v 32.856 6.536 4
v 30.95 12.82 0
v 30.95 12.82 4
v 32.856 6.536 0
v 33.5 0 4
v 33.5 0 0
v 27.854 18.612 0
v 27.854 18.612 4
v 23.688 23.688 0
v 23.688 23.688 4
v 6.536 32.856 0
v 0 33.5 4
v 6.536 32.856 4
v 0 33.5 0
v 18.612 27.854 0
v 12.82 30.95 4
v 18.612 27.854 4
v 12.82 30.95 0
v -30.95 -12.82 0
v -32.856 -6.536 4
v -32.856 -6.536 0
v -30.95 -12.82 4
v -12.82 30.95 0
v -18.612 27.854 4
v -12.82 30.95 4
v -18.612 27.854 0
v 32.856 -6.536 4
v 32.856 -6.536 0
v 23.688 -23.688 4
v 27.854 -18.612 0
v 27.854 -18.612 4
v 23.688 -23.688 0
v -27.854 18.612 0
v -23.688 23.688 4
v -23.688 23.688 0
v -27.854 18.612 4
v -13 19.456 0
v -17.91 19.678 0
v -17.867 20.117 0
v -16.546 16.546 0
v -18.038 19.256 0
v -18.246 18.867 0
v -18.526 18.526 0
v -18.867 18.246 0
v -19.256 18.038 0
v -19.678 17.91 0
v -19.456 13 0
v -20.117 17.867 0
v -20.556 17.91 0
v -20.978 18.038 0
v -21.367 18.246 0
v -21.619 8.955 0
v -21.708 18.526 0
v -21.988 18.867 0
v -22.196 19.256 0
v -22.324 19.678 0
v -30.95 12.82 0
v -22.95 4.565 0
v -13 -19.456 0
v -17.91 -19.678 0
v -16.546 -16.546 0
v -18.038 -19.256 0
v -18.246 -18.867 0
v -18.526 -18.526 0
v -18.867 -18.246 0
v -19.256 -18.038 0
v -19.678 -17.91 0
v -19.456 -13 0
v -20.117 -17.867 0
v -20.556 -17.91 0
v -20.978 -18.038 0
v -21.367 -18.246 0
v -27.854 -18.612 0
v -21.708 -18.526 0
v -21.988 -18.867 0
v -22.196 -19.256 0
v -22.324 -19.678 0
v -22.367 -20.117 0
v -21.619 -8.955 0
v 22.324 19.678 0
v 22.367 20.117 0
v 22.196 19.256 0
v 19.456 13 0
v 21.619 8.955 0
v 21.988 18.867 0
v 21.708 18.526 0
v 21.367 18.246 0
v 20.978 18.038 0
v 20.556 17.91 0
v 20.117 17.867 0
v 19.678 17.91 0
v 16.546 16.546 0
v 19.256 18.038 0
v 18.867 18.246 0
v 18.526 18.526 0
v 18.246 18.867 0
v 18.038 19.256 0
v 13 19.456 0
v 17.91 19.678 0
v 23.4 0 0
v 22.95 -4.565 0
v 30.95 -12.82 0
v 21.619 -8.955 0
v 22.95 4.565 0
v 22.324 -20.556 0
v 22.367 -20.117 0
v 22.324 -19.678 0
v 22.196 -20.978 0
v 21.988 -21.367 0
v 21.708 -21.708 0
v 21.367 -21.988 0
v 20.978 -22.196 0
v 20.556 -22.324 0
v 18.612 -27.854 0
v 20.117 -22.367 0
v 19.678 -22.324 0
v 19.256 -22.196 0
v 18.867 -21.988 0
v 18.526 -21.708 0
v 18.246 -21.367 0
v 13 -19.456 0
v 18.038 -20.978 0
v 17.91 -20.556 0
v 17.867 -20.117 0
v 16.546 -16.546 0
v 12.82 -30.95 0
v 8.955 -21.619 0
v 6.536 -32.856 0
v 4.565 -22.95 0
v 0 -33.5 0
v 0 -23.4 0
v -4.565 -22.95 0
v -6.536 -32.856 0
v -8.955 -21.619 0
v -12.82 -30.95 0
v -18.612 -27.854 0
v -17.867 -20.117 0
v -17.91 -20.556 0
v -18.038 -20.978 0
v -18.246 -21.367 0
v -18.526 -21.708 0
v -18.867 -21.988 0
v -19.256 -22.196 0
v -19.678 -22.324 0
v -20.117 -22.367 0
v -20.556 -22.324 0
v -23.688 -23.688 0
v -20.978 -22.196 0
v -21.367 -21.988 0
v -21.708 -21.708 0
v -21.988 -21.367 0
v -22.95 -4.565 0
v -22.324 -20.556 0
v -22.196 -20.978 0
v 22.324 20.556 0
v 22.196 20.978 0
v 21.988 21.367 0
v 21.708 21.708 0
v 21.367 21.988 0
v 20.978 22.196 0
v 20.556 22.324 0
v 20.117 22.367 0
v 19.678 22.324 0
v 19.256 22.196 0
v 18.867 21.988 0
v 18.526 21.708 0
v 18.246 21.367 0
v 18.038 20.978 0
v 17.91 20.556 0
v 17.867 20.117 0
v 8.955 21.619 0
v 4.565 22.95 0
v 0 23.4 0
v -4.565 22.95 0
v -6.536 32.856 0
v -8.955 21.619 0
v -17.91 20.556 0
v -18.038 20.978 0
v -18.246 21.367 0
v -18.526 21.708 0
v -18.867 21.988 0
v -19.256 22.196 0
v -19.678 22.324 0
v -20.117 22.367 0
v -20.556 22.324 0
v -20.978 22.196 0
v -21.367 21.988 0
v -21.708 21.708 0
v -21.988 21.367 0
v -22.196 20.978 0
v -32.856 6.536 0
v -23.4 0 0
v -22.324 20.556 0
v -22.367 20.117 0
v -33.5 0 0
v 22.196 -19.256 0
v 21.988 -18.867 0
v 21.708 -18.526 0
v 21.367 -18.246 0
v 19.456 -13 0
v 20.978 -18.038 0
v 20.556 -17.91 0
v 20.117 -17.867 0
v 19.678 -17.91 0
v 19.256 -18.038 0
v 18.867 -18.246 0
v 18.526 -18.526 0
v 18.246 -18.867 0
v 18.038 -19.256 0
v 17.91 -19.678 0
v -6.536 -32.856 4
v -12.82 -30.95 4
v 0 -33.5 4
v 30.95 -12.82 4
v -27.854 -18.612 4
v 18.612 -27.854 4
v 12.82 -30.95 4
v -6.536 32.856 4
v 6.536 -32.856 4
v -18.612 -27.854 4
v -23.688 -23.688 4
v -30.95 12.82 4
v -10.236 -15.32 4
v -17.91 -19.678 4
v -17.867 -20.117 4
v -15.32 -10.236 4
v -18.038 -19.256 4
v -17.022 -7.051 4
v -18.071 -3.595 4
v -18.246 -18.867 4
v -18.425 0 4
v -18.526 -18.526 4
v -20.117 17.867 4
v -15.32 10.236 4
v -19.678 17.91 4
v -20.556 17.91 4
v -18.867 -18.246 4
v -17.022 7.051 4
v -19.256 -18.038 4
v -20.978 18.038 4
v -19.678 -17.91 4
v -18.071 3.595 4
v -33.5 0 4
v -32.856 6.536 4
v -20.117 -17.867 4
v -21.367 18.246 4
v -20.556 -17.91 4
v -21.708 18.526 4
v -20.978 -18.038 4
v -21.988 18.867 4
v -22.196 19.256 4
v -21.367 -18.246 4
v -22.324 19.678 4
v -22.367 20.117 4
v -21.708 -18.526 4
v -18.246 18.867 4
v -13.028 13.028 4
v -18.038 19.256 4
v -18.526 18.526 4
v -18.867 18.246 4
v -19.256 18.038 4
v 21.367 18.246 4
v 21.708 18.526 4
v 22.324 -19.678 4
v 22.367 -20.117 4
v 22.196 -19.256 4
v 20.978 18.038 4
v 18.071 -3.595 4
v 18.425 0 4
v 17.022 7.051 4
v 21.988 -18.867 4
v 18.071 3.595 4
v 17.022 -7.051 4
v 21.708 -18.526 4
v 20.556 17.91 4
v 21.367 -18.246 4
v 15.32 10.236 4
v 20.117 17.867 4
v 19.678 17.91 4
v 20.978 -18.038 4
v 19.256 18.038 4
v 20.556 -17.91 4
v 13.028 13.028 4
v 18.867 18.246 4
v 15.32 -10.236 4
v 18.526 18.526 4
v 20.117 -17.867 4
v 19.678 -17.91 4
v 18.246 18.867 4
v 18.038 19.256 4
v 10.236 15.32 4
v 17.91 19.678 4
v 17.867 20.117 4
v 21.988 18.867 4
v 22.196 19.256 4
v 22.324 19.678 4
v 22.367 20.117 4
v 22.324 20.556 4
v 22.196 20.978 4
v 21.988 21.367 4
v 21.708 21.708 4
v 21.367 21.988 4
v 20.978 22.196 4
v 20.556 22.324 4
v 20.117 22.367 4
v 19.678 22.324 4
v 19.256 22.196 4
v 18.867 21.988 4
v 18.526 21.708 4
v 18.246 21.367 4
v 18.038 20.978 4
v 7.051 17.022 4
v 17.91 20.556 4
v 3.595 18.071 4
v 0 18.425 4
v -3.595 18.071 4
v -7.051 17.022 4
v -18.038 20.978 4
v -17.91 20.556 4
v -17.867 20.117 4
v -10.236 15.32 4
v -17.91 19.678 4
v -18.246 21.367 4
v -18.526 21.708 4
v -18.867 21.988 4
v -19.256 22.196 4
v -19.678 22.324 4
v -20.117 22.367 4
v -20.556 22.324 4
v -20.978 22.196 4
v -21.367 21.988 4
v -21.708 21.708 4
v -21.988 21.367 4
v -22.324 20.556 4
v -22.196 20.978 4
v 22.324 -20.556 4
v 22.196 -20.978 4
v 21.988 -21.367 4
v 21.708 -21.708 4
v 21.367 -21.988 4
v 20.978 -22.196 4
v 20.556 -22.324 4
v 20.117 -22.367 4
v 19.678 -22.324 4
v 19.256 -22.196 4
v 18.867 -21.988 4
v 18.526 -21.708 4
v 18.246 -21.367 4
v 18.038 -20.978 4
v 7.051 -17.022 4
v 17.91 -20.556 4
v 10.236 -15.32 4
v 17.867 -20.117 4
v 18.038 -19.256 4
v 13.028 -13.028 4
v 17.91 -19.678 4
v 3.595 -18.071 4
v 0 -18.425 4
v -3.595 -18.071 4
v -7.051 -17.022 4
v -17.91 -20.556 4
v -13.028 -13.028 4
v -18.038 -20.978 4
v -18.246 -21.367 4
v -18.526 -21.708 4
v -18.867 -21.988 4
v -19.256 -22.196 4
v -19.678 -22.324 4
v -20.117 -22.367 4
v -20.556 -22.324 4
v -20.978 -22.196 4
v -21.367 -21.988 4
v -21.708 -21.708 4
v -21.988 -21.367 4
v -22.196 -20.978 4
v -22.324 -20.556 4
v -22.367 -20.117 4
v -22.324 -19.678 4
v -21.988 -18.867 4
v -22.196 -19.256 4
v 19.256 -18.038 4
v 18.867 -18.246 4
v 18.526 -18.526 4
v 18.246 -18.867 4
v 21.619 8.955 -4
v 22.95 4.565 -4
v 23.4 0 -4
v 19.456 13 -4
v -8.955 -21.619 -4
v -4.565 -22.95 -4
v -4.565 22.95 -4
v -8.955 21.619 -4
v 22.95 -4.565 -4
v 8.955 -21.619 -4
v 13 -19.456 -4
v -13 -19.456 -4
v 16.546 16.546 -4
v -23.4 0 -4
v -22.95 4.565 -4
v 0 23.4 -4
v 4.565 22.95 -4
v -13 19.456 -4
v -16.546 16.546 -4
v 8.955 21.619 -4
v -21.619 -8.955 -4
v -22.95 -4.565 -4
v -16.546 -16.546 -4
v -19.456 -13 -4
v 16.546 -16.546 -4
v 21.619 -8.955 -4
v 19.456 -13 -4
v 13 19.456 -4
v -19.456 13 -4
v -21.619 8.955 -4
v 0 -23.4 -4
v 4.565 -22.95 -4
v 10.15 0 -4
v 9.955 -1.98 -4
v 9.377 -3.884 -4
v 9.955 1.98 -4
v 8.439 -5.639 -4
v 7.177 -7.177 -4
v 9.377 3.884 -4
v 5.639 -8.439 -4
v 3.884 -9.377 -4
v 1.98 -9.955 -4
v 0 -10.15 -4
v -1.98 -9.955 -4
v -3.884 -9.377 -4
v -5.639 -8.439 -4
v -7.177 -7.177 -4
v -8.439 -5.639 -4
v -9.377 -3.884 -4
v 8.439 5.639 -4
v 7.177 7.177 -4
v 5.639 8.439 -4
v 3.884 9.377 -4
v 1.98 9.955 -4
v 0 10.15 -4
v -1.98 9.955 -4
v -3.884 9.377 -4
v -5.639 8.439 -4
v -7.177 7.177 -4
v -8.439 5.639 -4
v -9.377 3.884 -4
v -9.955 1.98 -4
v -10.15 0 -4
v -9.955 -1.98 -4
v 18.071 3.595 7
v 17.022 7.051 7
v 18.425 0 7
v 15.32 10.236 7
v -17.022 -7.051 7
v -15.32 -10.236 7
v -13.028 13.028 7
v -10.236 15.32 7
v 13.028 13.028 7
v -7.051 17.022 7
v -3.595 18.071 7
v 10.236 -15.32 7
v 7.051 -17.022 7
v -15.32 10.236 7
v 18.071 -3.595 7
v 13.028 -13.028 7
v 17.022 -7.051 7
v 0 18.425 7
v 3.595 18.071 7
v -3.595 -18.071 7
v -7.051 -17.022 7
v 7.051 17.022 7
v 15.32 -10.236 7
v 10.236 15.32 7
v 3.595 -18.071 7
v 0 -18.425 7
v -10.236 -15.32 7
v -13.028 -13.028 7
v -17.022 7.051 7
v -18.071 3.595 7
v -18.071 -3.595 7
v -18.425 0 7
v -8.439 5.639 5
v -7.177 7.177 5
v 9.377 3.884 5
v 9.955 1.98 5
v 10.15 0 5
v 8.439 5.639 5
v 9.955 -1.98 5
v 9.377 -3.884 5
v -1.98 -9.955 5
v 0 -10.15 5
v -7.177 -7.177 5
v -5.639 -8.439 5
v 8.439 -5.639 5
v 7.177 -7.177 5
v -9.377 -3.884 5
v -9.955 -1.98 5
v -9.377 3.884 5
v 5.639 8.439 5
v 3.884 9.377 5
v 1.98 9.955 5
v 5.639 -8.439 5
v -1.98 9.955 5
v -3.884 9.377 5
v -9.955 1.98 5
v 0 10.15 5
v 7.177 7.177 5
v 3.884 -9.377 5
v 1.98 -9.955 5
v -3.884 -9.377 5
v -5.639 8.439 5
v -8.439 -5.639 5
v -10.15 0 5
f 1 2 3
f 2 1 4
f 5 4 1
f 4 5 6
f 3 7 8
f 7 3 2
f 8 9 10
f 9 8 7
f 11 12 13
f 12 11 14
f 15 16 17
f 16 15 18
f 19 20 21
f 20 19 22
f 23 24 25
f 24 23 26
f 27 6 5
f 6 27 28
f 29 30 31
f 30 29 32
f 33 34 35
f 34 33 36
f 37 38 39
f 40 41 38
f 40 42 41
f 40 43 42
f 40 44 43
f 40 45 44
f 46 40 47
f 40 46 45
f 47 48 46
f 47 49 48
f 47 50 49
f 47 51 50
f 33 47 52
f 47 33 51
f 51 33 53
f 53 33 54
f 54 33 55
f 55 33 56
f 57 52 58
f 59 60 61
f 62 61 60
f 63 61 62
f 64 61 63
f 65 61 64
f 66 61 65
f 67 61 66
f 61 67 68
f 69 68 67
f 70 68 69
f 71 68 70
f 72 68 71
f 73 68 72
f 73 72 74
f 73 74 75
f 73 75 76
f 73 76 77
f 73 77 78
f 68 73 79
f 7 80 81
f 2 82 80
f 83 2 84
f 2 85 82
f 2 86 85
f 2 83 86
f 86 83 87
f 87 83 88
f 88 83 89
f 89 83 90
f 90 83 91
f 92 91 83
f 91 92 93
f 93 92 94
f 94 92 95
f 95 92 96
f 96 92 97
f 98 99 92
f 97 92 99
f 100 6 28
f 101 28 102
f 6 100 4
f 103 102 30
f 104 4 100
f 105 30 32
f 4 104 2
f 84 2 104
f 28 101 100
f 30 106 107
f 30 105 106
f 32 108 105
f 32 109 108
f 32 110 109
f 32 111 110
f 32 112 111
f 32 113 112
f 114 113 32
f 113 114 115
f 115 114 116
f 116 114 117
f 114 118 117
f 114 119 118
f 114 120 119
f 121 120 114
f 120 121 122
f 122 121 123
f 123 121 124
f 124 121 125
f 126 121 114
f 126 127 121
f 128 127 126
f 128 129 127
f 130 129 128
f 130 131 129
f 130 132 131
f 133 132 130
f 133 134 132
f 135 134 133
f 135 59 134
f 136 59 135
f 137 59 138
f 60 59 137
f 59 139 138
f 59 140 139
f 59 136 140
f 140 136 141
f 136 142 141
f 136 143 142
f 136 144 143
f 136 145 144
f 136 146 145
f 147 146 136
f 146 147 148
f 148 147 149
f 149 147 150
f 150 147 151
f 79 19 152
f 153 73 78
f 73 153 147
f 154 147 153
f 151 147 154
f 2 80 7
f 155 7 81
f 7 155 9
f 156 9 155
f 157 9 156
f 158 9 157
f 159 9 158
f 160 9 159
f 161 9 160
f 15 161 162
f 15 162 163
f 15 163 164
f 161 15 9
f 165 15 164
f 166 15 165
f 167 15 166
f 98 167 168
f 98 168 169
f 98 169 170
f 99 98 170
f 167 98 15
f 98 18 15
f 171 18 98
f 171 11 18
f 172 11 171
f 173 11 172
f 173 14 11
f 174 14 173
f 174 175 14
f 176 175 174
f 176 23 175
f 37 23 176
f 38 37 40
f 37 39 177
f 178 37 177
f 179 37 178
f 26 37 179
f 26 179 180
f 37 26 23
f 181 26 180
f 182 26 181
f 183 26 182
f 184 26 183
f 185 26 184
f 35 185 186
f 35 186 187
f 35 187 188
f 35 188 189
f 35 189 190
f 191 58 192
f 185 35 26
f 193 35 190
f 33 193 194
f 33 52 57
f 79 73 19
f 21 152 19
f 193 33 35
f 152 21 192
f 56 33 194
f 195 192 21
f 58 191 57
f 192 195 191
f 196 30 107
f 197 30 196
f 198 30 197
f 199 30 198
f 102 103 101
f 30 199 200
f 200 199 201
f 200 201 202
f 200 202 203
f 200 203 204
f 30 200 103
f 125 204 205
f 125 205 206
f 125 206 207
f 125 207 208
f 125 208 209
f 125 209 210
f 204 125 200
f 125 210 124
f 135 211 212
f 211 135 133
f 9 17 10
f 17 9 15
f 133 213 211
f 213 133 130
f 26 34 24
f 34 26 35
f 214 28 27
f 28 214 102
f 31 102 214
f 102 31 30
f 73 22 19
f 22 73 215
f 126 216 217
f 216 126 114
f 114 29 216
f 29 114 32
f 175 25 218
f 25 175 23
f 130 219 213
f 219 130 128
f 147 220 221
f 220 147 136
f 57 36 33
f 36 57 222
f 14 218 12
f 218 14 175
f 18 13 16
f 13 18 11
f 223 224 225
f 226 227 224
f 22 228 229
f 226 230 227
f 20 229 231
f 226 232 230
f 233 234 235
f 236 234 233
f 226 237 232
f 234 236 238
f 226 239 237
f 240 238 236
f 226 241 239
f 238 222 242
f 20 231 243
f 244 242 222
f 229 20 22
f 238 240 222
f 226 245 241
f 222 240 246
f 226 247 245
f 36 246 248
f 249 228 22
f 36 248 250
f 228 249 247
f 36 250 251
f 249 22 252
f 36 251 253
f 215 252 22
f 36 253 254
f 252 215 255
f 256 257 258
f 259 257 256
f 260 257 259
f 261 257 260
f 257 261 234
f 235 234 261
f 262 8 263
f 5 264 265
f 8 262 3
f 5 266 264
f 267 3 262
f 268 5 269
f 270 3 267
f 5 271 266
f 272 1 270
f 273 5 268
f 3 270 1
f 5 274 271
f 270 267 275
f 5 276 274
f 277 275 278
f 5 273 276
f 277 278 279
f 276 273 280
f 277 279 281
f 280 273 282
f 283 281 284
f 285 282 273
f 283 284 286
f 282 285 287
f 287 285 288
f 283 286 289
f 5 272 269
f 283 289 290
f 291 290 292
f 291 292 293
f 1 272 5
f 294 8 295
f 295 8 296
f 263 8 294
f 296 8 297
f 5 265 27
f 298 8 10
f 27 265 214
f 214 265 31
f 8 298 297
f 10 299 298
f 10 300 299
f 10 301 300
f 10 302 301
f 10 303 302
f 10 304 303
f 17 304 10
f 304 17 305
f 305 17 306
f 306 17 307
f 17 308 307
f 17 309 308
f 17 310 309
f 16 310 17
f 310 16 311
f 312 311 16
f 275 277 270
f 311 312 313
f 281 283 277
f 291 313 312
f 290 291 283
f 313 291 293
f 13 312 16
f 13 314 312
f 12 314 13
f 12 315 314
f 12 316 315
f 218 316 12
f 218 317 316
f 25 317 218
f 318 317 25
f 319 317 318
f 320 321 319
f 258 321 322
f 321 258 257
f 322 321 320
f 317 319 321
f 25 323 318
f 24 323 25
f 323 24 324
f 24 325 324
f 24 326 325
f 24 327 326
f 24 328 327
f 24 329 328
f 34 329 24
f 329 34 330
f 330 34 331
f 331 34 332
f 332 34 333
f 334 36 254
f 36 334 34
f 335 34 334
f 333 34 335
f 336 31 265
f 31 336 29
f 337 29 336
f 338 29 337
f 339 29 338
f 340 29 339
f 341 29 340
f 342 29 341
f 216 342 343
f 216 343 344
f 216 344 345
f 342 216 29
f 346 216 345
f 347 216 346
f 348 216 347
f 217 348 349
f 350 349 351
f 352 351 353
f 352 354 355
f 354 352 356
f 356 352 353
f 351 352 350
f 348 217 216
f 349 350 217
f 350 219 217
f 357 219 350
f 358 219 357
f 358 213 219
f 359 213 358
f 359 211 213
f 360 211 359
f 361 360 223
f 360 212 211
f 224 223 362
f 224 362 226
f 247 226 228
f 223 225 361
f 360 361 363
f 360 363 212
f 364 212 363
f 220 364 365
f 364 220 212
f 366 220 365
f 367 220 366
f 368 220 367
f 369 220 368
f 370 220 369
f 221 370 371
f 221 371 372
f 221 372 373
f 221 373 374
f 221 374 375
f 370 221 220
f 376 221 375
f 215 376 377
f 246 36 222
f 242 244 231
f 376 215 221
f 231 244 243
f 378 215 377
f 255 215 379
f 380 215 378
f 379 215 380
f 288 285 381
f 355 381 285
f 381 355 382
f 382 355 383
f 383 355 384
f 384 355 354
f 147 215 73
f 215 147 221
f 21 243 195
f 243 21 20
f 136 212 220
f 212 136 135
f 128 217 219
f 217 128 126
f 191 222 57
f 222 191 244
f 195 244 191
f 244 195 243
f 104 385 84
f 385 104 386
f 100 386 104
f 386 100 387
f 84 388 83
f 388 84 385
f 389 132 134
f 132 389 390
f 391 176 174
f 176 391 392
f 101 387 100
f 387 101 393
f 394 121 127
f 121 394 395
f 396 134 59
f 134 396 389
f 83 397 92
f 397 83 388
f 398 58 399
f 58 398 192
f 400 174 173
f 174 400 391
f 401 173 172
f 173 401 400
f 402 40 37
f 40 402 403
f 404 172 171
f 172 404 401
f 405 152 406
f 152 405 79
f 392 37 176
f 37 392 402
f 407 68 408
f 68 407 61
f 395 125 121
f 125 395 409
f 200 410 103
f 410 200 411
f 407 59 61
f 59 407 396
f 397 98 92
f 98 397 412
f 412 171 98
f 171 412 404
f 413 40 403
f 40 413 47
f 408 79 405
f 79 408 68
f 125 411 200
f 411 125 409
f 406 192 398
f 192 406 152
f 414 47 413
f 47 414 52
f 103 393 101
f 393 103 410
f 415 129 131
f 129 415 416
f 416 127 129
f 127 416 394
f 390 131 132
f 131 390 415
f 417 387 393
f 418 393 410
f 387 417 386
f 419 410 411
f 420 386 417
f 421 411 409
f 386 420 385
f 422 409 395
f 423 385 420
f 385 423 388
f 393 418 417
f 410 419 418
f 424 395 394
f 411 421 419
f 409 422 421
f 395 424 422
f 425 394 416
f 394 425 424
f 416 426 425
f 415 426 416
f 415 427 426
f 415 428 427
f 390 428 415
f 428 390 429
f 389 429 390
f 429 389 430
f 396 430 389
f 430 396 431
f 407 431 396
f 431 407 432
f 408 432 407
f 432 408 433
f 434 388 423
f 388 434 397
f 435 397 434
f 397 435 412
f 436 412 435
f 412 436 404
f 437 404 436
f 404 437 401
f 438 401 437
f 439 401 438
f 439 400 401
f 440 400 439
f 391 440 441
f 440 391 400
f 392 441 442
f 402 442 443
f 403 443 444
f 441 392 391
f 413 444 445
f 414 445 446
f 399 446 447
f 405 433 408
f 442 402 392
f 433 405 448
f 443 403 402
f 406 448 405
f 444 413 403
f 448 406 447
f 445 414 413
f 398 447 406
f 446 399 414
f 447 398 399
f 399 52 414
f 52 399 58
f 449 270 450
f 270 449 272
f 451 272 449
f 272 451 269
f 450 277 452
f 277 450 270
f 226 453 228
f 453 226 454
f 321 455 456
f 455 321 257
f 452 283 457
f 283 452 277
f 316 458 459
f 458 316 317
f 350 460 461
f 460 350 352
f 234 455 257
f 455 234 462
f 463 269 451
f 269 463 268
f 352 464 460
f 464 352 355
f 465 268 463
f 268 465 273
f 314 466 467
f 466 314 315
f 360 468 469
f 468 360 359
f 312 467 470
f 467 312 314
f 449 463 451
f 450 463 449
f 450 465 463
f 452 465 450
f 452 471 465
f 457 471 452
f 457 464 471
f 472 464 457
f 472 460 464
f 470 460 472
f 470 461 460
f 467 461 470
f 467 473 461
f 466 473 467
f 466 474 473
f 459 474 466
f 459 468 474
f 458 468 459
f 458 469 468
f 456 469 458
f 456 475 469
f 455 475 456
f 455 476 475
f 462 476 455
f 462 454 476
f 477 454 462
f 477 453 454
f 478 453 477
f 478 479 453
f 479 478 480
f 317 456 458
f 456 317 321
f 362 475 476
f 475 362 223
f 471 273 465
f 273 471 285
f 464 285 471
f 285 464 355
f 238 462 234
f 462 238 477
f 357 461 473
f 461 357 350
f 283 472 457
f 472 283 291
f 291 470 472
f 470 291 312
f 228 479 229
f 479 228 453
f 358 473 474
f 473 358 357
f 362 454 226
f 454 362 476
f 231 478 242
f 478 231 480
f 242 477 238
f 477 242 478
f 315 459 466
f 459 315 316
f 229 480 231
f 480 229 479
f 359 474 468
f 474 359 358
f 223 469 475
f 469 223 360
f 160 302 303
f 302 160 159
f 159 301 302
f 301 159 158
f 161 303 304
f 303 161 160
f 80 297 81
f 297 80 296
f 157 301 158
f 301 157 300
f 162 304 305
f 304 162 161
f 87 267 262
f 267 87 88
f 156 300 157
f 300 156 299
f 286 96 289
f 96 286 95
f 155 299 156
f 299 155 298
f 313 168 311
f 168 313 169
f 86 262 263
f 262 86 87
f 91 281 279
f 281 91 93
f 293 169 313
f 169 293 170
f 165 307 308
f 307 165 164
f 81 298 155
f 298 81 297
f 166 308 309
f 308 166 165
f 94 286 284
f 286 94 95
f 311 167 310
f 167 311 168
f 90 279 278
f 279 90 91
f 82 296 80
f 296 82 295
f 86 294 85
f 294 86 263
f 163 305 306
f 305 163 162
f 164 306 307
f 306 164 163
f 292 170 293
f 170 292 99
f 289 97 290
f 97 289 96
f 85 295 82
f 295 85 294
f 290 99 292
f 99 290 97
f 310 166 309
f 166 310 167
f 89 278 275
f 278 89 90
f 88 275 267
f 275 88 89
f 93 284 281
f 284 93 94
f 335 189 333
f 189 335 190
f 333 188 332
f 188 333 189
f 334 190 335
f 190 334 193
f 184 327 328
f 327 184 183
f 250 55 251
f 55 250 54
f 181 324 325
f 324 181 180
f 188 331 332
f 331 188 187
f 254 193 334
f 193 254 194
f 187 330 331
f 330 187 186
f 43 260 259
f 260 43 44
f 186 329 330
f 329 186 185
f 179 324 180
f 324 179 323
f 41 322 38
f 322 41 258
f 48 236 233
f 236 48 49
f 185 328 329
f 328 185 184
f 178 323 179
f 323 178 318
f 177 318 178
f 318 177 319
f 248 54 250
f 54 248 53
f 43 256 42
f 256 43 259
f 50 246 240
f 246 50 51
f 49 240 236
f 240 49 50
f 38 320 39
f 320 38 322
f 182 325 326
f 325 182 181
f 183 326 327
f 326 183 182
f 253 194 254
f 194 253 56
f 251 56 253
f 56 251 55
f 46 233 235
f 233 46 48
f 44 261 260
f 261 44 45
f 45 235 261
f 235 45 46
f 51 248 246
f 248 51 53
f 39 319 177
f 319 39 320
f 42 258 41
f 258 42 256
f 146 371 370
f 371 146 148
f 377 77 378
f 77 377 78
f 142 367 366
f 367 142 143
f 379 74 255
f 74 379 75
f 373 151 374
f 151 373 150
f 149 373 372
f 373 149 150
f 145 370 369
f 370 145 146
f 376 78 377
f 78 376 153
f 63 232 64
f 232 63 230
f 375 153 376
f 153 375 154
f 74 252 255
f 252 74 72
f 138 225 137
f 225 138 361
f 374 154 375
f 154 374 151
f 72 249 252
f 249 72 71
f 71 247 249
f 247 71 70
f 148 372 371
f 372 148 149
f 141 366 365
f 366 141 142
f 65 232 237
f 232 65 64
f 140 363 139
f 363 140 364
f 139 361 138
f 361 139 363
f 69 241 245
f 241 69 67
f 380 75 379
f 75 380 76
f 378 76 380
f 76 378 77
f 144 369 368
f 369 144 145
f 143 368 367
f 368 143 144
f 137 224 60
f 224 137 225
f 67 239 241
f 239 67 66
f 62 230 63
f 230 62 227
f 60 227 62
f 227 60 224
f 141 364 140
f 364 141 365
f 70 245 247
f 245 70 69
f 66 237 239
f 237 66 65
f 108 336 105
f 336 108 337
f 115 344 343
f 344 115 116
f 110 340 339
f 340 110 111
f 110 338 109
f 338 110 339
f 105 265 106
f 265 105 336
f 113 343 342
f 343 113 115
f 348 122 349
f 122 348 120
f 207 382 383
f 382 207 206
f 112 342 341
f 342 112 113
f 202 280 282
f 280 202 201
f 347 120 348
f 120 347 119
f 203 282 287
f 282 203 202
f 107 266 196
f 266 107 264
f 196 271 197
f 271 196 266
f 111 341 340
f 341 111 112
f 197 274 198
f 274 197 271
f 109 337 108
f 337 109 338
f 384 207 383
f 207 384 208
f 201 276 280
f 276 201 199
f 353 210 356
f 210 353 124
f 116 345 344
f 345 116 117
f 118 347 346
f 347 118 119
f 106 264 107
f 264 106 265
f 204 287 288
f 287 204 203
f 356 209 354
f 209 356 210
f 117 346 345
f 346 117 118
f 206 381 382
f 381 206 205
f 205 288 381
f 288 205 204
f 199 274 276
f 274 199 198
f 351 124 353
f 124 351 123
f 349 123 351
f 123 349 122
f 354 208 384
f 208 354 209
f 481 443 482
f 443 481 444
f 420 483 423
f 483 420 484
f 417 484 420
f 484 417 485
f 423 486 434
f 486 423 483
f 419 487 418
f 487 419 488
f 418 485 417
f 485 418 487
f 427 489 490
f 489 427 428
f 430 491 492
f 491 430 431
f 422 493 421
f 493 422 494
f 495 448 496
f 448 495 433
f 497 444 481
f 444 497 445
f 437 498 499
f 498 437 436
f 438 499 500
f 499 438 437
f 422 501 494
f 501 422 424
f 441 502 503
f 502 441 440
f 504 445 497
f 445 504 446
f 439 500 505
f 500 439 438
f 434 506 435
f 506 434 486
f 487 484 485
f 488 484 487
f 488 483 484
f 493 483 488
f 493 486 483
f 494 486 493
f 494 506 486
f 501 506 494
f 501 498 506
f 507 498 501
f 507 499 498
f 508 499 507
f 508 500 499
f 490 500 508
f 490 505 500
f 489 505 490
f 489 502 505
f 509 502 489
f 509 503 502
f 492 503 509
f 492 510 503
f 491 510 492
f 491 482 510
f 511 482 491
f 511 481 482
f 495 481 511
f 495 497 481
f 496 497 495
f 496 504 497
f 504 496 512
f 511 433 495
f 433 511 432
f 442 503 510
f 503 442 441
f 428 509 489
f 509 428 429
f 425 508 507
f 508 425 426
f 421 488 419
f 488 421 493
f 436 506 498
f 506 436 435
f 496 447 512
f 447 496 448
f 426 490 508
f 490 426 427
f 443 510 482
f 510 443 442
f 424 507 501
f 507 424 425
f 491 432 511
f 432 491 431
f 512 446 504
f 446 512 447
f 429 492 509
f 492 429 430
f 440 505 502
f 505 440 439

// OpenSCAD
$fn = 32;

// ----------------------------------------------------------------------
// Retaining cap: 6204 cover, 67 mm, spigot 46.8 mm
// ----------------------------------------------------------------------

// --- parameters (mm) ---
cover_d = 67;             // cover diameter
cover_t = 4;              // cover thickness
spigot_d = 46.8;          // spigot that enters the housing
spigot_h = 4;             // spigot height
shaft_d = 20.3;           // shaft opening
bolt_d = 4.5;             // bolt clearance
bolt_r = 28.45;           // bolt circle radius
dome_h = 3;               // raised centre

module cover() {
  cylinder(h = cover_t, d = cover_d);
}

module spigot() {
  /* sunk 1 mm into the cover; the spigot sets the overall height */
  translate([0, 0, -spigot_h]) cylinder(h = spigot_h + 1, d = spigot_d);
}

module dome() {
  translate([0, 0, cover_t - 1]) cylinder(h = dome_h + 1, d = cover_d * 0.55);
}

difference() {
  union() {
    cover();
    spigot();
    dome();
  }
  for (i = [0 : 3]) rotate([0, 0, 45 + i * 90]) translate([bolt_r, 0, -spigot_h - 1])
    cylinder(h = spigot_h + cover_t + 2, d = bolt_d);
  translate([0, 0, -spigot_h - 1]) cylinder(h = spigot_h + cover_t + 2, d = shaft_d);
}
